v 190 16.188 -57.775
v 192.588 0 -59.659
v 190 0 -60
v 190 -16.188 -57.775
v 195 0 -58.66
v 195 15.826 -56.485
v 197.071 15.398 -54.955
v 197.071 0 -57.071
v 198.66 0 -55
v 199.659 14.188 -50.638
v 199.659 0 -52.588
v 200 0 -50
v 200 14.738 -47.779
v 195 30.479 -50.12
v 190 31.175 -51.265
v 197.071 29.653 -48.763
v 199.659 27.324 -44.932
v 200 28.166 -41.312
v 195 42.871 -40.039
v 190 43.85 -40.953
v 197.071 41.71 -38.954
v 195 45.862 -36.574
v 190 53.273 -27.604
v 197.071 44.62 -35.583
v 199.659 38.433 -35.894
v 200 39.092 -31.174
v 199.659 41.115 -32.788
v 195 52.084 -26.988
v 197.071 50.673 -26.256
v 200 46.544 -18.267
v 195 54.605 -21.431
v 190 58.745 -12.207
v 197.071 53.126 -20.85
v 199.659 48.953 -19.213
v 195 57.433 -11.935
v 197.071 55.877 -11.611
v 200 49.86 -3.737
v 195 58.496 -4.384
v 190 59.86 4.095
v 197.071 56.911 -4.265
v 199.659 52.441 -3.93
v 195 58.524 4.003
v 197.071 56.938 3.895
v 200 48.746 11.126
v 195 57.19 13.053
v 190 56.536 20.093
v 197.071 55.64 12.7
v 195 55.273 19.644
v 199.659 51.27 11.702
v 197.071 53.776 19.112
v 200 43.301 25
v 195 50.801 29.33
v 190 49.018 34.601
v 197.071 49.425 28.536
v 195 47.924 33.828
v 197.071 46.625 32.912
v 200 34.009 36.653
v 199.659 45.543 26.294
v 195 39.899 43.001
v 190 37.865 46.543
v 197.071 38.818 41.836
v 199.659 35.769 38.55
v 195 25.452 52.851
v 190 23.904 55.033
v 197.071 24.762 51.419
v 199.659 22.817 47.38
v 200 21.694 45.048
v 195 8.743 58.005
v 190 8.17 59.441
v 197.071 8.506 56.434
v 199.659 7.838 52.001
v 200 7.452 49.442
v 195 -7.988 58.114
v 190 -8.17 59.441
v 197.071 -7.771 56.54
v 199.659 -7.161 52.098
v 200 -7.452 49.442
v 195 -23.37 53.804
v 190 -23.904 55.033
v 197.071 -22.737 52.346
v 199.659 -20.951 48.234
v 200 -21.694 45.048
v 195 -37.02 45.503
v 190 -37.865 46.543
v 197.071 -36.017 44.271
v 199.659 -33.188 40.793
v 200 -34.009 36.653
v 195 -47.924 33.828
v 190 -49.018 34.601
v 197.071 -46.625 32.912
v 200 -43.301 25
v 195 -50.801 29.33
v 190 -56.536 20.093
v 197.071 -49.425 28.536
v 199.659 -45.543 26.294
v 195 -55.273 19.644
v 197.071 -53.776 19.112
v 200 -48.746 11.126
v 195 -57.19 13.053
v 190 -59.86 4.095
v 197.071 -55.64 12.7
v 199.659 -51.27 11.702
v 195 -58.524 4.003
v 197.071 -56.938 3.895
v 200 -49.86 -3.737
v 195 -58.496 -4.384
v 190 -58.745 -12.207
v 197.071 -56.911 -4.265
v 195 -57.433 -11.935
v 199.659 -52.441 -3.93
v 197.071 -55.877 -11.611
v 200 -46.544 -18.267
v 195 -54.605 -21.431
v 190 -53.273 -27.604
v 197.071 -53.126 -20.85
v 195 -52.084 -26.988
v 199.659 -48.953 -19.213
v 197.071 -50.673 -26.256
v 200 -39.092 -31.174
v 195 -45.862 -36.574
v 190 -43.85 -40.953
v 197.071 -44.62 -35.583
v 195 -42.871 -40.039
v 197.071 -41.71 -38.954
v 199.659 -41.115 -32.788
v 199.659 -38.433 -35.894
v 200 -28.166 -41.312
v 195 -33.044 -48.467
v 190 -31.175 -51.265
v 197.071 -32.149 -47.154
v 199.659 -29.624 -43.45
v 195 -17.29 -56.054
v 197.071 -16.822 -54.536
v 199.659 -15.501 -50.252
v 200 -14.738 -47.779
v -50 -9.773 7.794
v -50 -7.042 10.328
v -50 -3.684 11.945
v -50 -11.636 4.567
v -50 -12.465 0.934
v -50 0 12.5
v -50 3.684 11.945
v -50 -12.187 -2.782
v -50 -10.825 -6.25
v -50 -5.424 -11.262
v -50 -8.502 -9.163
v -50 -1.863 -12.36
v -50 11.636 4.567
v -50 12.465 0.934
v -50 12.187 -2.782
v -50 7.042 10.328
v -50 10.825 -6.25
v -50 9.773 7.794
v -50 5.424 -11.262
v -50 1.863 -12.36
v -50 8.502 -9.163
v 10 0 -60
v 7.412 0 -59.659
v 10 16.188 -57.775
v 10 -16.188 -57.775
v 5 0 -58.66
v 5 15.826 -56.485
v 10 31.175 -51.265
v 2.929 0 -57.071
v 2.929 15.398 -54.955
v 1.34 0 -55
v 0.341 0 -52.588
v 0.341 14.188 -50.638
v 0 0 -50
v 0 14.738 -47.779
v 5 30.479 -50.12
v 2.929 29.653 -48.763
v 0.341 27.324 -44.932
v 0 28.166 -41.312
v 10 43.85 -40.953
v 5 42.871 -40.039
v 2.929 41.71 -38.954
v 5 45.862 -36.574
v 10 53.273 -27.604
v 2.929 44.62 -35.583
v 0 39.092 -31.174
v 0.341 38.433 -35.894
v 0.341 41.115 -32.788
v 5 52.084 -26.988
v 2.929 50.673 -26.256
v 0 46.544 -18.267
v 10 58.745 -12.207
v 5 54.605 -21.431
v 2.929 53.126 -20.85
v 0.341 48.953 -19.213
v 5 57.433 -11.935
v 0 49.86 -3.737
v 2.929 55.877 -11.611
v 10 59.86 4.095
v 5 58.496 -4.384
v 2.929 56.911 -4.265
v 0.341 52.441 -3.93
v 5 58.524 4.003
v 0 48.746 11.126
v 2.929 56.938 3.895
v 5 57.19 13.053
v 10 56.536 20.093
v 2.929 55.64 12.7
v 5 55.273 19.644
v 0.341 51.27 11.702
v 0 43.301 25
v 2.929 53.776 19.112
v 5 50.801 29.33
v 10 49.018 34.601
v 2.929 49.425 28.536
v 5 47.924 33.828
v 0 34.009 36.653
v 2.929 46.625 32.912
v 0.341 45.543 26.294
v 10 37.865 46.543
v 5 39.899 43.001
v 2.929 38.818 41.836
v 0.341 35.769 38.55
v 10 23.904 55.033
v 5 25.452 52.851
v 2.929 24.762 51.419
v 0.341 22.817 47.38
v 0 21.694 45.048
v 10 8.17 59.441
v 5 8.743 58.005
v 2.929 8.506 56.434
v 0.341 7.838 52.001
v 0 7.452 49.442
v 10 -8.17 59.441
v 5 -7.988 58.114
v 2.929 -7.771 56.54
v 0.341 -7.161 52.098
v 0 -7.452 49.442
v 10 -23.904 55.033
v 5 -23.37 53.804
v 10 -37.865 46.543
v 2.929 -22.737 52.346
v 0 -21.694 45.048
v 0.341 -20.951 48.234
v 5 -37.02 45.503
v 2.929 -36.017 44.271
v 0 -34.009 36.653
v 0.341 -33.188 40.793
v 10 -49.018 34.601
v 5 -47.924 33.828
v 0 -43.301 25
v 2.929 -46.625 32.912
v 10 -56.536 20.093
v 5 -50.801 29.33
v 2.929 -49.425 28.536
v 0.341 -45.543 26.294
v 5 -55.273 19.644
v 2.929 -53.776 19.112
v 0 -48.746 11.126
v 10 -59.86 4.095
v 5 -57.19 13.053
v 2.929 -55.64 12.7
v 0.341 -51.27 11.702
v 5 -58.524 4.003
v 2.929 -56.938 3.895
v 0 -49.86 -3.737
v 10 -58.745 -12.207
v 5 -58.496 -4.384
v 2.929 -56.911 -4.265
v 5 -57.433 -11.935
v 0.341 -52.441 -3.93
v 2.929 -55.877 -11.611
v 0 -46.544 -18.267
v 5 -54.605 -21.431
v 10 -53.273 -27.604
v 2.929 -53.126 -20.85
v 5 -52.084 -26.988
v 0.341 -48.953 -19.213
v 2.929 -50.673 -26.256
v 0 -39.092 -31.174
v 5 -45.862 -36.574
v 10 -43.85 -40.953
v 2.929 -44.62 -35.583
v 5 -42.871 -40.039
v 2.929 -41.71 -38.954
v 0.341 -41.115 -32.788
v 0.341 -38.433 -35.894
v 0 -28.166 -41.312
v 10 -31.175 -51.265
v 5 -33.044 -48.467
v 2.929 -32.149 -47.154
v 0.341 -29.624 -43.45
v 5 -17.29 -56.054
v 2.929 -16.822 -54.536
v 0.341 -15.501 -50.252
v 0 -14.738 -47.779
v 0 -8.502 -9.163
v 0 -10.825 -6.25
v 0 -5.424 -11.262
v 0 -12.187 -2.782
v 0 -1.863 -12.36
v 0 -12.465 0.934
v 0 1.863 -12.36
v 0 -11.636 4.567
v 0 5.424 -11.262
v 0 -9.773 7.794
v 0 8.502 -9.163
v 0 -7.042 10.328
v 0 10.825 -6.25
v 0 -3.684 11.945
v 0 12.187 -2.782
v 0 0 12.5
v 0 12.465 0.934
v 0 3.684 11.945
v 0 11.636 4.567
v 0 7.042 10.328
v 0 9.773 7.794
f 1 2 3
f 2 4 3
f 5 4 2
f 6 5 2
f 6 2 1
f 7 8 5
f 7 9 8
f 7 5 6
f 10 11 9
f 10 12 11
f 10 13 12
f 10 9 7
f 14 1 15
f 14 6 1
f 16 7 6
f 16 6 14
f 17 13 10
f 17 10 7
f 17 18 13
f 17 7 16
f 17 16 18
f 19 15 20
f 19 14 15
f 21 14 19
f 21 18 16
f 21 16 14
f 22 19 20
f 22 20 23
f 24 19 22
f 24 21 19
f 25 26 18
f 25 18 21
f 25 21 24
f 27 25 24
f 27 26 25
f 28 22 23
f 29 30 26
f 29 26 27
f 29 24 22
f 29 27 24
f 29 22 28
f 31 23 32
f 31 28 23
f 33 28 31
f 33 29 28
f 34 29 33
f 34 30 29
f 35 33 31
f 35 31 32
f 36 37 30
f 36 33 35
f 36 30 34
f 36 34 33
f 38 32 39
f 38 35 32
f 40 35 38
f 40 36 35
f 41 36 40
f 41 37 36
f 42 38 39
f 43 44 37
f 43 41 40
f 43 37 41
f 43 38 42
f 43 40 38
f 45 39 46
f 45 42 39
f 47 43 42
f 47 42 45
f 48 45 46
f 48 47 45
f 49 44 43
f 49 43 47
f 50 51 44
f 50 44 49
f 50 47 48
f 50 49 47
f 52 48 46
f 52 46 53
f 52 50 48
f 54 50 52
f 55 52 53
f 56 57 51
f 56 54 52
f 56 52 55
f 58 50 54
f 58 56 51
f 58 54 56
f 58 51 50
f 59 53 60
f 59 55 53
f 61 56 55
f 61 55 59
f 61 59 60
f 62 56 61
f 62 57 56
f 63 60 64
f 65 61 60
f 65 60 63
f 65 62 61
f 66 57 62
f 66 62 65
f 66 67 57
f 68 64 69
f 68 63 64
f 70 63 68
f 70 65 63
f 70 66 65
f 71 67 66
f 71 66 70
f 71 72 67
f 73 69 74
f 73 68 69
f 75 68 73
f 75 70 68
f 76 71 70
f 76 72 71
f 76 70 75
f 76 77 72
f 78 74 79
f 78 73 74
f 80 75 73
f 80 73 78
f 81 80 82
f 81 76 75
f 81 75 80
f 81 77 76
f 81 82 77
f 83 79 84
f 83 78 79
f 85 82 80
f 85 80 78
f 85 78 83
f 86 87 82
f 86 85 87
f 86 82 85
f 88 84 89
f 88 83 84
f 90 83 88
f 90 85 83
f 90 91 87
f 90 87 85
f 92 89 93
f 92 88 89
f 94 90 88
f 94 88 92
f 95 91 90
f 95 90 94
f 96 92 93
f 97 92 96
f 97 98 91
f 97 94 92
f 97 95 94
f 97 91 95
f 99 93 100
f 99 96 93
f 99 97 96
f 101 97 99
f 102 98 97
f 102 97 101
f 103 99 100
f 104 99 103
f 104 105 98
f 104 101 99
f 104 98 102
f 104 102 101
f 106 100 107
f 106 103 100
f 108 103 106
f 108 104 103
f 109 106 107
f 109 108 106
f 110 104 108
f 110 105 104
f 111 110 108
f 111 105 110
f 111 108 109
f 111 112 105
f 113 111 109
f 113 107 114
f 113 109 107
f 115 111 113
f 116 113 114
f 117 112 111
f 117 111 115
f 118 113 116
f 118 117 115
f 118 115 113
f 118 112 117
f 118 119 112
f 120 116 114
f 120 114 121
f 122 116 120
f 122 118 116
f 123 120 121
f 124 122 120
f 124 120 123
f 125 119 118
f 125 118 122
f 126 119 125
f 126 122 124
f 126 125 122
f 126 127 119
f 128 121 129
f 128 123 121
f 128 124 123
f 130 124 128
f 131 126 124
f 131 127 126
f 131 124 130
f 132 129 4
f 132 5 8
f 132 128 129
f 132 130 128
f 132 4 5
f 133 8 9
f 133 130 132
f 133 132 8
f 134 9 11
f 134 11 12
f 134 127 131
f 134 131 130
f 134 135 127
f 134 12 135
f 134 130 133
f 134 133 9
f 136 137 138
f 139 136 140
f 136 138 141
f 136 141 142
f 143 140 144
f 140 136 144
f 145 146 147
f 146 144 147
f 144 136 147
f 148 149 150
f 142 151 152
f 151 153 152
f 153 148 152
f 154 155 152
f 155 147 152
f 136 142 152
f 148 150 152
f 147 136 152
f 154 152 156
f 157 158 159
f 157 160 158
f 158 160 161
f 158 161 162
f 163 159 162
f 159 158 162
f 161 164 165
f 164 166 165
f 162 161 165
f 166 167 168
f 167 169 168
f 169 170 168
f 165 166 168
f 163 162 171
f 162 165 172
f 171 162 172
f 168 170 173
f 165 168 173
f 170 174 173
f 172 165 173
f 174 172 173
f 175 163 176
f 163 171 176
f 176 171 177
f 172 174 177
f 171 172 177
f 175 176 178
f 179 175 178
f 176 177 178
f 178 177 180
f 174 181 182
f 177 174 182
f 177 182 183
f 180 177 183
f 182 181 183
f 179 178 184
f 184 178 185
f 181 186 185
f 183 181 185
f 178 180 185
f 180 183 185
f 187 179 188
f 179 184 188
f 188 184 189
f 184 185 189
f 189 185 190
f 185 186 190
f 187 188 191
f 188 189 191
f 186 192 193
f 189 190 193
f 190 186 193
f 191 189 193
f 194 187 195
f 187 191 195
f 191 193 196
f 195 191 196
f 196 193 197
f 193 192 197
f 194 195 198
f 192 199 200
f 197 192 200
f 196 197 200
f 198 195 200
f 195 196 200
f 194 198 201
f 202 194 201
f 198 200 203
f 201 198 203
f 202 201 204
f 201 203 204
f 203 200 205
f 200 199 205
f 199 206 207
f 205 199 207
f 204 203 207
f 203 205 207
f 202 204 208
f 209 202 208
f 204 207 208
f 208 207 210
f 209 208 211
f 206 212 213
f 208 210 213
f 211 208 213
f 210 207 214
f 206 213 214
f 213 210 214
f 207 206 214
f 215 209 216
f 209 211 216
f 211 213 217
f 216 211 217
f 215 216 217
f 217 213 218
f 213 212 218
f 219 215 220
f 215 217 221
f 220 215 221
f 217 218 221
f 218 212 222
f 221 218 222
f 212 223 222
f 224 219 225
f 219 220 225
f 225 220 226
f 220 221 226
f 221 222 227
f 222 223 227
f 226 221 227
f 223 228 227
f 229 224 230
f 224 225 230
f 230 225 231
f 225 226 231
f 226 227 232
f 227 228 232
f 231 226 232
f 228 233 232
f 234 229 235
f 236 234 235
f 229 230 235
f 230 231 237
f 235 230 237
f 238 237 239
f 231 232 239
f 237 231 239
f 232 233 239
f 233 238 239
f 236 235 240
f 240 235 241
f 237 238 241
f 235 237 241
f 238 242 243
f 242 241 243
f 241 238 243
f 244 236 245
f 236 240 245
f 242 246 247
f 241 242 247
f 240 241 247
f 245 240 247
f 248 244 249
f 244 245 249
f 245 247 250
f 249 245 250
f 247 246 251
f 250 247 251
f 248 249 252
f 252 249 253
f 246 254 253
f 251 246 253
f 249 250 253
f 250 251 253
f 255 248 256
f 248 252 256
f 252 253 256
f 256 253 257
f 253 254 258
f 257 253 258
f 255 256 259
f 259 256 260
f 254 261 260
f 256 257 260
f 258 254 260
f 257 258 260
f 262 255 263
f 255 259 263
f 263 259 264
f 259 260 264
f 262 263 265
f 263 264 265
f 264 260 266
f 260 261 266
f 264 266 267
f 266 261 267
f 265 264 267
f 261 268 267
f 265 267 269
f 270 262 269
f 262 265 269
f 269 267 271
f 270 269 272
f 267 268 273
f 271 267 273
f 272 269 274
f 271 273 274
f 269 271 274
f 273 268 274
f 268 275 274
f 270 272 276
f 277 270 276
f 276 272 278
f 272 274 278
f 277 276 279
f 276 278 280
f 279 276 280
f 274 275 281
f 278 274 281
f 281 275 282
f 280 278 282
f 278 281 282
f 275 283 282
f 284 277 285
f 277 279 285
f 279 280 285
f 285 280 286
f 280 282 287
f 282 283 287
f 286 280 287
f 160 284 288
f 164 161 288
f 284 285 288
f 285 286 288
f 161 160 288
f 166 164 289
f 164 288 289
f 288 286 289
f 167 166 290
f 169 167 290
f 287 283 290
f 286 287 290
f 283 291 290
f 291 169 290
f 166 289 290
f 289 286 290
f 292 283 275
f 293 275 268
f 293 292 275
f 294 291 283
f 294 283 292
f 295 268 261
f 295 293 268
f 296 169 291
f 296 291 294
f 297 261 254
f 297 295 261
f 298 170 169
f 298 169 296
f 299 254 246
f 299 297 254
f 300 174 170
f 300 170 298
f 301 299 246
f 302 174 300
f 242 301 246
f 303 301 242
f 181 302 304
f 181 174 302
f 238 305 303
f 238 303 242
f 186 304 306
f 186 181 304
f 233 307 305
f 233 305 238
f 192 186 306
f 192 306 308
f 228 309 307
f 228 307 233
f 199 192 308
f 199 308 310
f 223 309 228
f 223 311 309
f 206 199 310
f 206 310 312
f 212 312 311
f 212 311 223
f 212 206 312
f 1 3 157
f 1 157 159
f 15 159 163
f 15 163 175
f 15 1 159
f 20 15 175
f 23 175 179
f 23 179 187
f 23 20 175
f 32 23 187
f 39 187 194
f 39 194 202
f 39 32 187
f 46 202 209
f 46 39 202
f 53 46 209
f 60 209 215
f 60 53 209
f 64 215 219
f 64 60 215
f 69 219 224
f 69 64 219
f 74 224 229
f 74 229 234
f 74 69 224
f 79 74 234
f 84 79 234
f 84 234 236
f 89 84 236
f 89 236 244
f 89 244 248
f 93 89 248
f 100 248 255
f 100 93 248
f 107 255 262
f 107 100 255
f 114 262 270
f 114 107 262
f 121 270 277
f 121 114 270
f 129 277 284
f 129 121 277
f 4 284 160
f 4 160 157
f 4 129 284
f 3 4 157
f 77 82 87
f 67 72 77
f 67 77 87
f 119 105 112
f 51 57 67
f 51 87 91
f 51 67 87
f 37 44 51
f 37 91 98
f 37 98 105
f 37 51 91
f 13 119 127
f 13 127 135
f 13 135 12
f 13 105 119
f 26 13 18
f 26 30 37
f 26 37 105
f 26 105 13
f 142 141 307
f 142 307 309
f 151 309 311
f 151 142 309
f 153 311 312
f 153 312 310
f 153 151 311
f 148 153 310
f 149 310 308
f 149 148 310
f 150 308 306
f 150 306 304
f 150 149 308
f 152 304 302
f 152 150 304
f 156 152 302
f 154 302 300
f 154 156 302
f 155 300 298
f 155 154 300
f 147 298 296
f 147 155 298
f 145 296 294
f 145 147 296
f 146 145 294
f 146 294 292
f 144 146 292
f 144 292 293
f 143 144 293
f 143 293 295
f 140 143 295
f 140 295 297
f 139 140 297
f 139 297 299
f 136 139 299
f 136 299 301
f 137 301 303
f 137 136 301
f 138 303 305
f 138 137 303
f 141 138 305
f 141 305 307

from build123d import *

# Parameters (mm, degrees)
SKETCH1_R                = 60
BOSS_EXTRUDE1_DEPTH      = 200
BOSS_EXTRUDE1_DEPTH_BACK = 50
SKETCH2_R                = 75
SKETCH2_R_2              = 12.5
CUT_EXTRUDE1_DEPTH       = 50
FILLET1_R                = 10


with BuildPart() as part:
    # Sketch1 → Boss-Extrude1 (new body, two sides)
    with BuildSketch(Plane(origin=(0, 0, 0), x_dir=(0, 0, -1), z_dir=(1, 0, 0))) as boss_extrude1_sk:
        Circle(SKETCH1_R)
    extrude(amount=BOSS_EXTRUDE1_DEPTH)
    extrude(boss_extrude1_sk.sketch, amount=-BOSS_EXTRUDE1_DEPTH_BACK)

    # Sketch2 → Cut-Extrude1 (cut)
    with BuildSketch(Plane.ZY.offset(50)):
        Circle(SKETCH2_R)
        Circle(SKETCH2_R_2, mode=Mode.SUBTRACT)
    extrude(amount=-CUT_EXTRUDE1_DEPTH, mode=Mode.SUBTRACT)

    # Fillet1
    fillet1_edges = [part.edges().sort_by_distance(p)[0] for p in [
        (0, 0, 60),
        (200, 0, 60),
    ]]
    fillet(fillet1_edges, radius=FILLET1_R)


solid = part.part
